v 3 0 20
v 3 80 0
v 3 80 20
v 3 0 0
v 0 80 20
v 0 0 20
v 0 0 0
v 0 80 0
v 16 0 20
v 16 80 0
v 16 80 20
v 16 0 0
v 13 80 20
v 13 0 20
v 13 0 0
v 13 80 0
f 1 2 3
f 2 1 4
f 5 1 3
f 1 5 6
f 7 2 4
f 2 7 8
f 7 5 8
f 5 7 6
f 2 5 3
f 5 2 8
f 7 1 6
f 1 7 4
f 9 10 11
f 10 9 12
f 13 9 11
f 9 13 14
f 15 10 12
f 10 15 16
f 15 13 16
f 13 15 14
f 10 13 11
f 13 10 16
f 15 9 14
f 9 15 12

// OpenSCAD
width_y = 80;
height_z = 20;
thickness = 3;
plate_count = 2;
plate_spacing = 10;

module placca_laterale() {
    cube([thickness, width_y, height_z]);
}

for (i = [0 : plate_count - 1]) {
    translate([i * (thickness + plate_spacing), 0, 0])
        placca_laterale();
}
